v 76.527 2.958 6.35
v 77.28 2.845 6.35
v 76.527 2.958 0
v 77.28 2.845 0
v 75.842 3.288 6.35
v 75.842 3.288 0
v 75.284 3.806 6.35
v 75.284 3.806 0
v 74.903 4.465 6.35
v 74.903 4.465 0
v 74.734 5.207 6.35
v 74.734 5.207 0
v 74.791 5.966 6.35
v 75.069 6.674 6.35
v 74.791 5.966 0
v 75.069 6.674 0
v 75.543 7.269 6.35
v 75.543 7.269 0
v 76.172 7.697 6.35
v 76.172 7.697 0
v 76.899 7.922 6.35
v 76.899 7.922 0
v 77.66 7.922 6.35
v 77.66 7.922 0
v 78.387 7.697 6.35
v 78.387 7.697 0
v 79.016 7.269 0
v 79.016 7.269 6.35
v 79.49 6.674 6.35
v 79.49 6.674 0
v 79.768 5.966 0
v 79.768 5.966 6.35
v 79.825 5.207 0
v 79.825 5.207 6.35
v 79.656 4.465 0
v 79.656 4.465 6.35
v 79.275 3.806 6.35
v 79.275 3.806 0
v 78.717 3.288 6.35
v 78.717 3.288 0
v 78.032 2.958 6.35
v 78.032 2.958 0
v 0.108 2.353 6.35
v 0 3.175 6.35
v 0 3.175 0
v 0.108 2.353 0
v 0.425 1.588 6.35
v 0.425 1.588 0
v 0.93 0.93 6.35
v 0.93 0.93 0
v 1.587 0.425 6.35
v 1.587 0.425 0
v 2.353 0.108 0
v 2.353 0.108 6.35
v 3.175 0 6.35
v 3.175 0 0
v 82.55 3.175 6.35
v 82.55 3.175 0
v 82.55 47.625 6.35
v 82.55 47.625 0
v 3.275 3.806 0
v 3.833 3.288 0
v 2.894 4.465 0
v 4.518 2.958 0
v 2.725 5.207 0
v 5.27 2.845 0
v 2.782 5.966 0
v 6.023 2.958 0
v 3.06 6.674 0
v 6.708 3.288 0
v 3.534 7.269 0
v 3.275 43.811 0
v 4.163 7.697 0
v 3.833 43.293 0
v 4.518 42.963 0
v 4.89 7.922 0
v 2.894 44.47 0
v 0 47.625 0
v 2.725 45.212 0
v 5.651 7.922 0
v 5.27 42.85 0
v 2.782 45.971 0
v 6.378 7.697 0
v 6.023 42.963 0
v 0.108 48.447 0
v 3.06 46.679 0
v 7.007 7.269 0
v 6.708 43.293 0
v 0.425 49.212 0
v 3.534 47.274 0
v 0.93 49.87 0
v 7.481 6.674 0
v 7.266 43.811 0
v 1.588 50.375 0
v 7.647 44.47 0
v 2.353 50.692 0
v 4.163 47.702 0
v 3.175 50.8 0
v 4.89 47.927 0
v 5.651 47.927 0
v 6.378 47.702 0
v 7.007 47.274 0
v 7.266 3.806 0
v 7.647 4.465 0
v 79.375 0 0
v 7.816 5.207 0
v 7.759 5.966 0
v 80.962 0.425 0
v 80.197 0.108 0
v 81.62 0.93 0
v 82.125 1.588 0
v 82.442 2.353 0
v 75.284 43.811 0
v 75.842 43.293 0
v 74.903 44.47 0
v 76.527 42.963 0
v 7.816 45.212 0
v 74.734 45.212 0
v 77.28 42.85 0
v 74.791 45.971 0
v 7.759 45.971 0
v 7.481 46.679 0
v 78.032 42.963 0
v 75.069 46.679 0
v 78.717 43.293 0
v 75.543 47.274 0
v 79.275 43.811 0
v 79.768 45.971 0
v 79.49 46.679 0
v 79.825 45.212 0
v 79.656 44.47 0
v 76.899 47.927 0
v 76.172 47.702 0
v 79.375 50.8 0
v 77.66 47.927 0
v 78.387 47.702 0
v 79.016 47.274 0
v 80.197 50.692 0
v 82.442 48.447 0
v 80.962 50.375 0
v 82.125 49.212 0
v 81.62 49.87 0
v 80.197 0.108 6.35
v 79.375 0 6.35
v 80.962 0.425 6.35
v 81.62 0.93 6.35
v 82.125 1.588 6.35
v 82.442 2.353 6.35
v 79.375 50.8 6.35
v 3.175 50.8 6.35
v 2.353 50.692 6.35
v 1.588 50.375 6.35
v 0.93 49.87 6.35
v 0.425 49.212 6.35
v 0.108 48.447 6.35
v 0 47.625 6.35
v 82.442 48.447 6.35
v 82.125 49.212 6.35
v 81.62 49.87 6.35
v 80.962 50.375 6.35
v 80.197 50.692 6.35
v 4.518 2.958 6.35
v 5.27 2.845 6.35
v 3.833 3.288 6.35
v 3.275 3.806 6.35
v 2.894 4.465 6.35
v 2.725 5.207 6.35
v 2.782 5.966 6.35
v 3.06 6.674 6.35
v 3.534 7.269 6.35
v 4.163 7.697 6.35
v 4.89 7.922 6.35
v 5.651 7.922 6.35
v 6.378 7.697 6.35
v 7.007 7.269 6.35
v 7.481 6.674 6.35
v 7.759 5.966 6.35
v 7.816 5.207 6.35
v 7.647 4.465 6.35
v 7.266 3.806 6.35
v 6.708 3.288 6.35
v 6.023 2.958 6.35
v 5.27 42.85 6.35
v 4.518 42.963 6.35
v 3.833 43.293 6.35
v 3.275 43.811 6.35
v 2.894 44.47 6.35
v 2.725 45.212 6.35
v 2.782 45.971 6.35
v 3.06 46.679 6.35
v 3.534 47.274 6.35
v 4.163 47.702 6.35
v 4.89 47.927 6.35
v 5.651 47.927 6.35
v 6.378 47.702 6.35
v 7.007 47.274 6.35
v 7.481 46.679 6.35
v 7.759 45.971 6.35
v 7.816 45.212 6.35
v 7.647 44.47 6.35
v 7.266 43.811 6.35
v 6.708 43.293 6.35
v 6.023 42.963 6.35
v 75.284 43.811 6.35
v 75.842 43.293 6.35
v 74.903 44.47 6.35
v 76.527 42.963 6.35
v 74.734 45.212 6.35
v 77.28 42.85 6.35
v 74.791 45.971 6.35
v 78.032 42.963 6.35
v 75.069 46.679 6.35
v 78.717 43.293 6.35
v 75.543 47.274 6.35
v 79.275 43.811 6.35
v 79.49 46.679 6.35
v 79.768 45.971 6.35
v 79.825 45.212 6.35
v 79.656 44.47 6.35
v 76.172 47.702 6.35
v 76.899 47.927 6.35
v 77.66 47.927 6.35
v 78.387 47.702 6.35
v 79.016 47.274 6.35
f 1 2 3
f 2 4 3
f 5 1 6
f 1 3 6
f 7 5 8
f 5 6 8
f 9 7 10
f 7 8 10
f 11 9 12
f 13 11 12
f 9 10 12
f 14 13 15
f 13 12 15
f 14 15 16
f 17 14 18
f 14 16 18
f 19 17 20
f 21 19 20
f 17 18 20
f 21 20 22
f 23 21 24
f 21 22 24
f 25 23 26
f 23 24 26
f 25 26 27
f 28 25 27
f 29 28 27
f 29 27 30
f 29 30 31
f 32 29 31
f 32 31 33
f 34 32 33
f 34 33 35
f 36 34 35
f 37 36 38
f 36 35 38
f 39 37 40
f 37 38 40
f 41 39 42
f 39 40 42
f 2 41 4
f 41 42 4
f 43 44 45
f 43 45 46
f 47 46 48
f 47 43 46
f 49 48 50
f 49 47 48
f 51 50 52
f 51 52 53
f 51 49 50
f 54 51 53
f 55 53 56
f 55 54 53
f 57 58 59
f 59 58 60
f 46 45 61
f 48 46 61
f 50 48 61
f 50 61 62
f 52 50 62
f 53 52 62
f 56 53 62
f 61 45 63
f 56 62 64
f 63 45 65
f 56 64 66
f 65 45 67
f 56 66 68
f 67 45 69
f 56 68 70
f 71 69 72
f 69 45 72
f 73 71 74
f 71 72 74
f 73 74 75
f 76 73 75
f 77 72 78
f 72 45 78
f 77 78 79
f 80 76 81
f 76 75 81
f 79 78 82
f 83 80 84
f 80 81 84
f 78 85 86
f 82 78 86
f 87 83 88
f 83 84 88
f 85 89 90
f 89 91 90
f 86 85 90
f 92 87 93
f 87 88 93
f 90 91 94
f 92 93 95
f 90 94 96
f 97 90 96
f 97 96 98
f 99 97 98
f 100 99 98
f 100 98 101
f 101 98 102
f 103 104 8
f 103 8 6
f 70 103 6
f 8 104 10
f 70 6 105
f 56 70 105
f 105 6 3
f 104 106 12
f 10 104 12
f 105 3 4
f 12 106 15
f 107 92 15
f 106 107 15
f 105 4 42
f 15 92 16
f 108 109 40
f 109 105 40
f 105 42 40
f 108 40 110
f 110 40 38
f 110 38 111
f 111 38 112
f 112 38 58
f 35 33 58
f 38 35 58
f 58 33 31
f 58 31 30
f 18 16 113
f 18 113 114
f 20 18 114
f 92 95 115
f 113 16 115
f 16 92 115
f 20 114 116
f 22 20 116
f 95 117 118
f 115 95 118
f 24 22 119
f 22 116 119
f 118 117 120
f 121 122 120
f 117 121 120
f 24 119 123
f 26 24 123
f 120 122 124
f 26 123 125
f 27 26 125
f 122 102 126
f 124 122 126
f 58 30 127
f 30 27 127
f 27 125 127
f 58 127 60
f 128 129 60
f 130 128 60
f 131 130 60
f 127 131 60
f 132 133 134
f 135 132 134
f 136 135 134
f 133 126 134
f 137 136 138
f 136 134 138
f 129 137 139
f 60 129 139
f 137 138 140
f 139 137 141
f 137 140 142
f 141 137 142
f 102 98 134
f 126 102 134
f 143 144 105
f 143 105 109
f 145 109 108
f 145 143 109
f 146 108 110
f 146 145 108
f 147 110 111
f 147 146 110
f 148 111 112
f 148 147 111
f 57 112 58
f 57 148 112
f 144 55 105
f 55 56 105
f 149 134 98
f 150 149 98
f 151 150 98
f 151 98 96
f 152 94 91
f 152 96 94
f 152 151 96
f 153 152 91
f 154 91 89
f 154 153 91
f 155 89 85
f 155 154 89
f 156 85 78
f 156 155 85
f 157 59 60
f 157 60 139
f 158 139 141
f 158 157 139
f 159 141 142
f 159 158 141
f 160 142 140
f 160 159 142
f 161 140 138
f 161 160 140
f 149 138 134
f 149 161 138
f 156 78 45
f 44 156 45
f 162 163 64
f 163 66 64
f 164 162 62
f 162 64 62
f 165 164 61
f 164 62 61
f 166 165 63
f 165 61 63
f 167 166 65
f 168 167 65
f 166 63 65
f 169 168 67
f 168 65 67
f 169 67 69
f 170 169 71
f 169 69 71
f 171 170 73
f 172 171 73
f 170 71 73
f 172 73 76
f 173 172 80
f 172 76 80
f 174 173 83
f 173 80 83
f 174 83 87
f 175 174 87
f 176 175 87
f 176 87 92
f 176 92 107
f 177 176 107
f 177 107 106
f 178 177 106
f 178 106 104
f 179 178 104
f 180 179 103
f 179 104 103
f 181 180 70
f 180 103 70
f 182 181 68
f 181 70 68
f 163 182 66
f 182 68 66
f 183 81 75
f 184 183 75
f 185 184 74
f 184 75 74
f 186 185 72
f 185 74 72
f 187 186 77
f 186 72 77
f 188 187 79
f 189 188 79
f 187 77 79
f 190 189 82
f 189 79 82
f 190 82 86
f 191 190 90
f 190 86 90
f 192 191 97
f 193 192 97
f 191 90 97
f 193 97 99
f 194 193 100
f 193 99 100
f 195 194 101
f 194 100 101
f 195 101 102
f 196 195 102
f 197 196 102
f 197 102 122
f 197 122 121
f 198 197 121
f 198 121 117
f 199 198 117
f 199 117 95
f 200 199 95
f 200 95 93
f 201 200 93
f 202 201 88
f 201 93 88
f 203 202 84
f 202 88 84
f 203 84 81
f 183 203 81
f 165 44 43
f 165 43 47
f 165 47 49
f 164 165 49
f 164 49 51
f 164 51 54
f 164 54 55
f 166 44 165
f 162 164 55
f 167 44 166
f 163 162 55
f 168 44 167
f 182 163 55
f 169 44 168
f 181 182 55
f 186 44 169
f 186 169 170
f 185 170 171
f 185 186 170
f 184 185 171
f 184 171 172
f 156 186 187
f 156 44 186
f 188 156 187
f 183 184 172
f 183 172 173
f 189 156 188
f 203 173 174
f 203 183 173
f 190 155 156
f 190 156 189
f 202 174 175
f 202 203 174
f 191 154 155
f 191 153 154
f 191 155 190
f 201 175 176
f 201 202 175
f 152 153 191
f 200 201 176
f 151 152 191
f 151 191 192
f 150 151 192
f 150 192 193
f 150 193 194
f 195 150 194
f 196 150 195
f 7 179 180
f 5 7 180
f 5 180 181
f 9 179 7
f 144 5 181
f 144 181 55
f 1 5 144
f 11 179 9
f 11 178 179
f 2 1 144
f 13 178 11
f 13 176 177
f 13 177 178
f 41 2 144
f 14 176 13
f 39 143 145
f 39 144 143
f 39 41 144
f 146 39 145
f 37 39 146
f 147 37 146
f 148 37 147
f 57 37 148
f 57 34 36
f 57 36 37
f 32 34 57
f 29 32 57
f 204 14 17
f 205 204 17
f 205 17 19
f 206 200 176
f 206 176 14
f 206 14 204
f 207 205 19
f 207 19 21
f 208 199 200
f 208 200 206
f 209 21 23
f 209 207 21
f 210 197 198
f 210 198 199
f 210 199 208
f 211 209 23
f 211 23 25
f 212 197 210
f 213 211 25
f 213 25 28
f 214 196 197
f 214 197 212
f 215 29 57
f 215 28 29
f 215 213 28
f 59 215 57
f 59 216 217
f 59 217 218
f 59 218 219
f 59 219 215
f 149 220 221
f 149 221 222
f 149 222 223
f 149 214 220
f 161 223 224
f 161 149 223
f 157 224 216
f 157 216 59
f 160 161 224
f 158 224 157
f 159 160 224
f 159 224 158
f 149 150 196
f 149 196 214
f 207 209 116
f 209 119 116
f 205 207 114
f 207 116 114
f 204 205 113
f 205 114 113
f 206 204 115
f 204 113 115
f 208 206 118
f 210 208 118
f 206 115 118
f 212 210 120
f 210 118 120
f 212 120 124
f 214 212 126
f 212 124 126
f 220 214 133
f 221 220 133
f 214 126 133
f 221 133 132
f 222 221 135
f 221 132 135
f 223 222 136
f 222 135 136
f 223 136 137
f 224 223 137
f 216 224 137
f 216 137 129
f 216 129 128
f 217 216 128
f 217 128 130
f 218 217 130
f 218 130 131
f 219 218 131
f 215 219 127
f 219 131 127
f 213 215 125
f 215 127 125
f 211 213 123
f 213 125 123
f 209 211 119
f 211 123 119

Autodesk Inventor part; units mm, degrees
ref_plane "YZ Plane" through (0, 0, 0) normal (1, 0, 0) x (0, 1, 0)
ref_plane "XZ Plane" through (0, 0, 0) normal (0, 1, 0) x (-1, 0, 0)
ref_plane "XY Plane" through (0, 0, 0) normal (0, 0, 1) x (1, 0, 0)
sketch "Sketch1" plane through (0, 0, 0) normal (0, 0, 1) x (1, 0, 0)
  line L0 (0, 0) -> (82.55, 0)
  line L1 (82.55, 0) -> (82.55, 50.8)
  line L2 (82.55, 50.8) -> (0, 50.8)
  line L3 (0, 50.8) -> (0, 0)
  dimension "d0" = 50.8
  dimension "d1" = 82.55
extrude "Extrusion1" add sketch "Sketch1" along normal blind 6.35
fillet "Fillet1" radius 3.175 4 edges at (82.55, 50.8, 3.175) (82.55, 0, 3.175) (0, 0, 3.175) (0, 50.8, 3.175)
sketch "Sketch2" plane through (0, 0, 6.35) normal (0, 0, 1) x (1, 0, 0)
  line L0 (5.2705, 45.4025) -> (77.2795, 45.4025) construction
  line L1 (77.2795, 45.4025) -> (77.2795, 5.3975) construction
  line L2 (77.2795, 5.3975) -> (5.2705, 5.3975) construction
  line L3 (5.2705, 5.3975) -> (5.2705, 45.4025) construction
  line L4 (0, 47.625) -> (0, 3.175) construction
  line L5 (79.375, 50.8) -> (3.175, 50.8) construction
  point P0 (0, 0)
  point P1 (5.2705, 25.4)
  point P2 (0, 25.4)
  point P3 (41.275, 45.4025)
  point P4 (41.275, 50.8)
  dimension "d5" = 72.009
  dimension "d6" = 40.005
hole "Hole1" at (5.2705, 45.4025, 6.35) at (77.2795, 45.4025, 6.35) at (77.2795, 5.3975, 6.35) at (5.2705, 5.3975, 6.35) direction (0, 0, -1) diameter 5.1054 end through all clearance for "Flat Head Machine Screw (82)" size "#10" standard "Ansi Unified Screw Threads"
properties part number "LL-001" material "ABS Plastic"
